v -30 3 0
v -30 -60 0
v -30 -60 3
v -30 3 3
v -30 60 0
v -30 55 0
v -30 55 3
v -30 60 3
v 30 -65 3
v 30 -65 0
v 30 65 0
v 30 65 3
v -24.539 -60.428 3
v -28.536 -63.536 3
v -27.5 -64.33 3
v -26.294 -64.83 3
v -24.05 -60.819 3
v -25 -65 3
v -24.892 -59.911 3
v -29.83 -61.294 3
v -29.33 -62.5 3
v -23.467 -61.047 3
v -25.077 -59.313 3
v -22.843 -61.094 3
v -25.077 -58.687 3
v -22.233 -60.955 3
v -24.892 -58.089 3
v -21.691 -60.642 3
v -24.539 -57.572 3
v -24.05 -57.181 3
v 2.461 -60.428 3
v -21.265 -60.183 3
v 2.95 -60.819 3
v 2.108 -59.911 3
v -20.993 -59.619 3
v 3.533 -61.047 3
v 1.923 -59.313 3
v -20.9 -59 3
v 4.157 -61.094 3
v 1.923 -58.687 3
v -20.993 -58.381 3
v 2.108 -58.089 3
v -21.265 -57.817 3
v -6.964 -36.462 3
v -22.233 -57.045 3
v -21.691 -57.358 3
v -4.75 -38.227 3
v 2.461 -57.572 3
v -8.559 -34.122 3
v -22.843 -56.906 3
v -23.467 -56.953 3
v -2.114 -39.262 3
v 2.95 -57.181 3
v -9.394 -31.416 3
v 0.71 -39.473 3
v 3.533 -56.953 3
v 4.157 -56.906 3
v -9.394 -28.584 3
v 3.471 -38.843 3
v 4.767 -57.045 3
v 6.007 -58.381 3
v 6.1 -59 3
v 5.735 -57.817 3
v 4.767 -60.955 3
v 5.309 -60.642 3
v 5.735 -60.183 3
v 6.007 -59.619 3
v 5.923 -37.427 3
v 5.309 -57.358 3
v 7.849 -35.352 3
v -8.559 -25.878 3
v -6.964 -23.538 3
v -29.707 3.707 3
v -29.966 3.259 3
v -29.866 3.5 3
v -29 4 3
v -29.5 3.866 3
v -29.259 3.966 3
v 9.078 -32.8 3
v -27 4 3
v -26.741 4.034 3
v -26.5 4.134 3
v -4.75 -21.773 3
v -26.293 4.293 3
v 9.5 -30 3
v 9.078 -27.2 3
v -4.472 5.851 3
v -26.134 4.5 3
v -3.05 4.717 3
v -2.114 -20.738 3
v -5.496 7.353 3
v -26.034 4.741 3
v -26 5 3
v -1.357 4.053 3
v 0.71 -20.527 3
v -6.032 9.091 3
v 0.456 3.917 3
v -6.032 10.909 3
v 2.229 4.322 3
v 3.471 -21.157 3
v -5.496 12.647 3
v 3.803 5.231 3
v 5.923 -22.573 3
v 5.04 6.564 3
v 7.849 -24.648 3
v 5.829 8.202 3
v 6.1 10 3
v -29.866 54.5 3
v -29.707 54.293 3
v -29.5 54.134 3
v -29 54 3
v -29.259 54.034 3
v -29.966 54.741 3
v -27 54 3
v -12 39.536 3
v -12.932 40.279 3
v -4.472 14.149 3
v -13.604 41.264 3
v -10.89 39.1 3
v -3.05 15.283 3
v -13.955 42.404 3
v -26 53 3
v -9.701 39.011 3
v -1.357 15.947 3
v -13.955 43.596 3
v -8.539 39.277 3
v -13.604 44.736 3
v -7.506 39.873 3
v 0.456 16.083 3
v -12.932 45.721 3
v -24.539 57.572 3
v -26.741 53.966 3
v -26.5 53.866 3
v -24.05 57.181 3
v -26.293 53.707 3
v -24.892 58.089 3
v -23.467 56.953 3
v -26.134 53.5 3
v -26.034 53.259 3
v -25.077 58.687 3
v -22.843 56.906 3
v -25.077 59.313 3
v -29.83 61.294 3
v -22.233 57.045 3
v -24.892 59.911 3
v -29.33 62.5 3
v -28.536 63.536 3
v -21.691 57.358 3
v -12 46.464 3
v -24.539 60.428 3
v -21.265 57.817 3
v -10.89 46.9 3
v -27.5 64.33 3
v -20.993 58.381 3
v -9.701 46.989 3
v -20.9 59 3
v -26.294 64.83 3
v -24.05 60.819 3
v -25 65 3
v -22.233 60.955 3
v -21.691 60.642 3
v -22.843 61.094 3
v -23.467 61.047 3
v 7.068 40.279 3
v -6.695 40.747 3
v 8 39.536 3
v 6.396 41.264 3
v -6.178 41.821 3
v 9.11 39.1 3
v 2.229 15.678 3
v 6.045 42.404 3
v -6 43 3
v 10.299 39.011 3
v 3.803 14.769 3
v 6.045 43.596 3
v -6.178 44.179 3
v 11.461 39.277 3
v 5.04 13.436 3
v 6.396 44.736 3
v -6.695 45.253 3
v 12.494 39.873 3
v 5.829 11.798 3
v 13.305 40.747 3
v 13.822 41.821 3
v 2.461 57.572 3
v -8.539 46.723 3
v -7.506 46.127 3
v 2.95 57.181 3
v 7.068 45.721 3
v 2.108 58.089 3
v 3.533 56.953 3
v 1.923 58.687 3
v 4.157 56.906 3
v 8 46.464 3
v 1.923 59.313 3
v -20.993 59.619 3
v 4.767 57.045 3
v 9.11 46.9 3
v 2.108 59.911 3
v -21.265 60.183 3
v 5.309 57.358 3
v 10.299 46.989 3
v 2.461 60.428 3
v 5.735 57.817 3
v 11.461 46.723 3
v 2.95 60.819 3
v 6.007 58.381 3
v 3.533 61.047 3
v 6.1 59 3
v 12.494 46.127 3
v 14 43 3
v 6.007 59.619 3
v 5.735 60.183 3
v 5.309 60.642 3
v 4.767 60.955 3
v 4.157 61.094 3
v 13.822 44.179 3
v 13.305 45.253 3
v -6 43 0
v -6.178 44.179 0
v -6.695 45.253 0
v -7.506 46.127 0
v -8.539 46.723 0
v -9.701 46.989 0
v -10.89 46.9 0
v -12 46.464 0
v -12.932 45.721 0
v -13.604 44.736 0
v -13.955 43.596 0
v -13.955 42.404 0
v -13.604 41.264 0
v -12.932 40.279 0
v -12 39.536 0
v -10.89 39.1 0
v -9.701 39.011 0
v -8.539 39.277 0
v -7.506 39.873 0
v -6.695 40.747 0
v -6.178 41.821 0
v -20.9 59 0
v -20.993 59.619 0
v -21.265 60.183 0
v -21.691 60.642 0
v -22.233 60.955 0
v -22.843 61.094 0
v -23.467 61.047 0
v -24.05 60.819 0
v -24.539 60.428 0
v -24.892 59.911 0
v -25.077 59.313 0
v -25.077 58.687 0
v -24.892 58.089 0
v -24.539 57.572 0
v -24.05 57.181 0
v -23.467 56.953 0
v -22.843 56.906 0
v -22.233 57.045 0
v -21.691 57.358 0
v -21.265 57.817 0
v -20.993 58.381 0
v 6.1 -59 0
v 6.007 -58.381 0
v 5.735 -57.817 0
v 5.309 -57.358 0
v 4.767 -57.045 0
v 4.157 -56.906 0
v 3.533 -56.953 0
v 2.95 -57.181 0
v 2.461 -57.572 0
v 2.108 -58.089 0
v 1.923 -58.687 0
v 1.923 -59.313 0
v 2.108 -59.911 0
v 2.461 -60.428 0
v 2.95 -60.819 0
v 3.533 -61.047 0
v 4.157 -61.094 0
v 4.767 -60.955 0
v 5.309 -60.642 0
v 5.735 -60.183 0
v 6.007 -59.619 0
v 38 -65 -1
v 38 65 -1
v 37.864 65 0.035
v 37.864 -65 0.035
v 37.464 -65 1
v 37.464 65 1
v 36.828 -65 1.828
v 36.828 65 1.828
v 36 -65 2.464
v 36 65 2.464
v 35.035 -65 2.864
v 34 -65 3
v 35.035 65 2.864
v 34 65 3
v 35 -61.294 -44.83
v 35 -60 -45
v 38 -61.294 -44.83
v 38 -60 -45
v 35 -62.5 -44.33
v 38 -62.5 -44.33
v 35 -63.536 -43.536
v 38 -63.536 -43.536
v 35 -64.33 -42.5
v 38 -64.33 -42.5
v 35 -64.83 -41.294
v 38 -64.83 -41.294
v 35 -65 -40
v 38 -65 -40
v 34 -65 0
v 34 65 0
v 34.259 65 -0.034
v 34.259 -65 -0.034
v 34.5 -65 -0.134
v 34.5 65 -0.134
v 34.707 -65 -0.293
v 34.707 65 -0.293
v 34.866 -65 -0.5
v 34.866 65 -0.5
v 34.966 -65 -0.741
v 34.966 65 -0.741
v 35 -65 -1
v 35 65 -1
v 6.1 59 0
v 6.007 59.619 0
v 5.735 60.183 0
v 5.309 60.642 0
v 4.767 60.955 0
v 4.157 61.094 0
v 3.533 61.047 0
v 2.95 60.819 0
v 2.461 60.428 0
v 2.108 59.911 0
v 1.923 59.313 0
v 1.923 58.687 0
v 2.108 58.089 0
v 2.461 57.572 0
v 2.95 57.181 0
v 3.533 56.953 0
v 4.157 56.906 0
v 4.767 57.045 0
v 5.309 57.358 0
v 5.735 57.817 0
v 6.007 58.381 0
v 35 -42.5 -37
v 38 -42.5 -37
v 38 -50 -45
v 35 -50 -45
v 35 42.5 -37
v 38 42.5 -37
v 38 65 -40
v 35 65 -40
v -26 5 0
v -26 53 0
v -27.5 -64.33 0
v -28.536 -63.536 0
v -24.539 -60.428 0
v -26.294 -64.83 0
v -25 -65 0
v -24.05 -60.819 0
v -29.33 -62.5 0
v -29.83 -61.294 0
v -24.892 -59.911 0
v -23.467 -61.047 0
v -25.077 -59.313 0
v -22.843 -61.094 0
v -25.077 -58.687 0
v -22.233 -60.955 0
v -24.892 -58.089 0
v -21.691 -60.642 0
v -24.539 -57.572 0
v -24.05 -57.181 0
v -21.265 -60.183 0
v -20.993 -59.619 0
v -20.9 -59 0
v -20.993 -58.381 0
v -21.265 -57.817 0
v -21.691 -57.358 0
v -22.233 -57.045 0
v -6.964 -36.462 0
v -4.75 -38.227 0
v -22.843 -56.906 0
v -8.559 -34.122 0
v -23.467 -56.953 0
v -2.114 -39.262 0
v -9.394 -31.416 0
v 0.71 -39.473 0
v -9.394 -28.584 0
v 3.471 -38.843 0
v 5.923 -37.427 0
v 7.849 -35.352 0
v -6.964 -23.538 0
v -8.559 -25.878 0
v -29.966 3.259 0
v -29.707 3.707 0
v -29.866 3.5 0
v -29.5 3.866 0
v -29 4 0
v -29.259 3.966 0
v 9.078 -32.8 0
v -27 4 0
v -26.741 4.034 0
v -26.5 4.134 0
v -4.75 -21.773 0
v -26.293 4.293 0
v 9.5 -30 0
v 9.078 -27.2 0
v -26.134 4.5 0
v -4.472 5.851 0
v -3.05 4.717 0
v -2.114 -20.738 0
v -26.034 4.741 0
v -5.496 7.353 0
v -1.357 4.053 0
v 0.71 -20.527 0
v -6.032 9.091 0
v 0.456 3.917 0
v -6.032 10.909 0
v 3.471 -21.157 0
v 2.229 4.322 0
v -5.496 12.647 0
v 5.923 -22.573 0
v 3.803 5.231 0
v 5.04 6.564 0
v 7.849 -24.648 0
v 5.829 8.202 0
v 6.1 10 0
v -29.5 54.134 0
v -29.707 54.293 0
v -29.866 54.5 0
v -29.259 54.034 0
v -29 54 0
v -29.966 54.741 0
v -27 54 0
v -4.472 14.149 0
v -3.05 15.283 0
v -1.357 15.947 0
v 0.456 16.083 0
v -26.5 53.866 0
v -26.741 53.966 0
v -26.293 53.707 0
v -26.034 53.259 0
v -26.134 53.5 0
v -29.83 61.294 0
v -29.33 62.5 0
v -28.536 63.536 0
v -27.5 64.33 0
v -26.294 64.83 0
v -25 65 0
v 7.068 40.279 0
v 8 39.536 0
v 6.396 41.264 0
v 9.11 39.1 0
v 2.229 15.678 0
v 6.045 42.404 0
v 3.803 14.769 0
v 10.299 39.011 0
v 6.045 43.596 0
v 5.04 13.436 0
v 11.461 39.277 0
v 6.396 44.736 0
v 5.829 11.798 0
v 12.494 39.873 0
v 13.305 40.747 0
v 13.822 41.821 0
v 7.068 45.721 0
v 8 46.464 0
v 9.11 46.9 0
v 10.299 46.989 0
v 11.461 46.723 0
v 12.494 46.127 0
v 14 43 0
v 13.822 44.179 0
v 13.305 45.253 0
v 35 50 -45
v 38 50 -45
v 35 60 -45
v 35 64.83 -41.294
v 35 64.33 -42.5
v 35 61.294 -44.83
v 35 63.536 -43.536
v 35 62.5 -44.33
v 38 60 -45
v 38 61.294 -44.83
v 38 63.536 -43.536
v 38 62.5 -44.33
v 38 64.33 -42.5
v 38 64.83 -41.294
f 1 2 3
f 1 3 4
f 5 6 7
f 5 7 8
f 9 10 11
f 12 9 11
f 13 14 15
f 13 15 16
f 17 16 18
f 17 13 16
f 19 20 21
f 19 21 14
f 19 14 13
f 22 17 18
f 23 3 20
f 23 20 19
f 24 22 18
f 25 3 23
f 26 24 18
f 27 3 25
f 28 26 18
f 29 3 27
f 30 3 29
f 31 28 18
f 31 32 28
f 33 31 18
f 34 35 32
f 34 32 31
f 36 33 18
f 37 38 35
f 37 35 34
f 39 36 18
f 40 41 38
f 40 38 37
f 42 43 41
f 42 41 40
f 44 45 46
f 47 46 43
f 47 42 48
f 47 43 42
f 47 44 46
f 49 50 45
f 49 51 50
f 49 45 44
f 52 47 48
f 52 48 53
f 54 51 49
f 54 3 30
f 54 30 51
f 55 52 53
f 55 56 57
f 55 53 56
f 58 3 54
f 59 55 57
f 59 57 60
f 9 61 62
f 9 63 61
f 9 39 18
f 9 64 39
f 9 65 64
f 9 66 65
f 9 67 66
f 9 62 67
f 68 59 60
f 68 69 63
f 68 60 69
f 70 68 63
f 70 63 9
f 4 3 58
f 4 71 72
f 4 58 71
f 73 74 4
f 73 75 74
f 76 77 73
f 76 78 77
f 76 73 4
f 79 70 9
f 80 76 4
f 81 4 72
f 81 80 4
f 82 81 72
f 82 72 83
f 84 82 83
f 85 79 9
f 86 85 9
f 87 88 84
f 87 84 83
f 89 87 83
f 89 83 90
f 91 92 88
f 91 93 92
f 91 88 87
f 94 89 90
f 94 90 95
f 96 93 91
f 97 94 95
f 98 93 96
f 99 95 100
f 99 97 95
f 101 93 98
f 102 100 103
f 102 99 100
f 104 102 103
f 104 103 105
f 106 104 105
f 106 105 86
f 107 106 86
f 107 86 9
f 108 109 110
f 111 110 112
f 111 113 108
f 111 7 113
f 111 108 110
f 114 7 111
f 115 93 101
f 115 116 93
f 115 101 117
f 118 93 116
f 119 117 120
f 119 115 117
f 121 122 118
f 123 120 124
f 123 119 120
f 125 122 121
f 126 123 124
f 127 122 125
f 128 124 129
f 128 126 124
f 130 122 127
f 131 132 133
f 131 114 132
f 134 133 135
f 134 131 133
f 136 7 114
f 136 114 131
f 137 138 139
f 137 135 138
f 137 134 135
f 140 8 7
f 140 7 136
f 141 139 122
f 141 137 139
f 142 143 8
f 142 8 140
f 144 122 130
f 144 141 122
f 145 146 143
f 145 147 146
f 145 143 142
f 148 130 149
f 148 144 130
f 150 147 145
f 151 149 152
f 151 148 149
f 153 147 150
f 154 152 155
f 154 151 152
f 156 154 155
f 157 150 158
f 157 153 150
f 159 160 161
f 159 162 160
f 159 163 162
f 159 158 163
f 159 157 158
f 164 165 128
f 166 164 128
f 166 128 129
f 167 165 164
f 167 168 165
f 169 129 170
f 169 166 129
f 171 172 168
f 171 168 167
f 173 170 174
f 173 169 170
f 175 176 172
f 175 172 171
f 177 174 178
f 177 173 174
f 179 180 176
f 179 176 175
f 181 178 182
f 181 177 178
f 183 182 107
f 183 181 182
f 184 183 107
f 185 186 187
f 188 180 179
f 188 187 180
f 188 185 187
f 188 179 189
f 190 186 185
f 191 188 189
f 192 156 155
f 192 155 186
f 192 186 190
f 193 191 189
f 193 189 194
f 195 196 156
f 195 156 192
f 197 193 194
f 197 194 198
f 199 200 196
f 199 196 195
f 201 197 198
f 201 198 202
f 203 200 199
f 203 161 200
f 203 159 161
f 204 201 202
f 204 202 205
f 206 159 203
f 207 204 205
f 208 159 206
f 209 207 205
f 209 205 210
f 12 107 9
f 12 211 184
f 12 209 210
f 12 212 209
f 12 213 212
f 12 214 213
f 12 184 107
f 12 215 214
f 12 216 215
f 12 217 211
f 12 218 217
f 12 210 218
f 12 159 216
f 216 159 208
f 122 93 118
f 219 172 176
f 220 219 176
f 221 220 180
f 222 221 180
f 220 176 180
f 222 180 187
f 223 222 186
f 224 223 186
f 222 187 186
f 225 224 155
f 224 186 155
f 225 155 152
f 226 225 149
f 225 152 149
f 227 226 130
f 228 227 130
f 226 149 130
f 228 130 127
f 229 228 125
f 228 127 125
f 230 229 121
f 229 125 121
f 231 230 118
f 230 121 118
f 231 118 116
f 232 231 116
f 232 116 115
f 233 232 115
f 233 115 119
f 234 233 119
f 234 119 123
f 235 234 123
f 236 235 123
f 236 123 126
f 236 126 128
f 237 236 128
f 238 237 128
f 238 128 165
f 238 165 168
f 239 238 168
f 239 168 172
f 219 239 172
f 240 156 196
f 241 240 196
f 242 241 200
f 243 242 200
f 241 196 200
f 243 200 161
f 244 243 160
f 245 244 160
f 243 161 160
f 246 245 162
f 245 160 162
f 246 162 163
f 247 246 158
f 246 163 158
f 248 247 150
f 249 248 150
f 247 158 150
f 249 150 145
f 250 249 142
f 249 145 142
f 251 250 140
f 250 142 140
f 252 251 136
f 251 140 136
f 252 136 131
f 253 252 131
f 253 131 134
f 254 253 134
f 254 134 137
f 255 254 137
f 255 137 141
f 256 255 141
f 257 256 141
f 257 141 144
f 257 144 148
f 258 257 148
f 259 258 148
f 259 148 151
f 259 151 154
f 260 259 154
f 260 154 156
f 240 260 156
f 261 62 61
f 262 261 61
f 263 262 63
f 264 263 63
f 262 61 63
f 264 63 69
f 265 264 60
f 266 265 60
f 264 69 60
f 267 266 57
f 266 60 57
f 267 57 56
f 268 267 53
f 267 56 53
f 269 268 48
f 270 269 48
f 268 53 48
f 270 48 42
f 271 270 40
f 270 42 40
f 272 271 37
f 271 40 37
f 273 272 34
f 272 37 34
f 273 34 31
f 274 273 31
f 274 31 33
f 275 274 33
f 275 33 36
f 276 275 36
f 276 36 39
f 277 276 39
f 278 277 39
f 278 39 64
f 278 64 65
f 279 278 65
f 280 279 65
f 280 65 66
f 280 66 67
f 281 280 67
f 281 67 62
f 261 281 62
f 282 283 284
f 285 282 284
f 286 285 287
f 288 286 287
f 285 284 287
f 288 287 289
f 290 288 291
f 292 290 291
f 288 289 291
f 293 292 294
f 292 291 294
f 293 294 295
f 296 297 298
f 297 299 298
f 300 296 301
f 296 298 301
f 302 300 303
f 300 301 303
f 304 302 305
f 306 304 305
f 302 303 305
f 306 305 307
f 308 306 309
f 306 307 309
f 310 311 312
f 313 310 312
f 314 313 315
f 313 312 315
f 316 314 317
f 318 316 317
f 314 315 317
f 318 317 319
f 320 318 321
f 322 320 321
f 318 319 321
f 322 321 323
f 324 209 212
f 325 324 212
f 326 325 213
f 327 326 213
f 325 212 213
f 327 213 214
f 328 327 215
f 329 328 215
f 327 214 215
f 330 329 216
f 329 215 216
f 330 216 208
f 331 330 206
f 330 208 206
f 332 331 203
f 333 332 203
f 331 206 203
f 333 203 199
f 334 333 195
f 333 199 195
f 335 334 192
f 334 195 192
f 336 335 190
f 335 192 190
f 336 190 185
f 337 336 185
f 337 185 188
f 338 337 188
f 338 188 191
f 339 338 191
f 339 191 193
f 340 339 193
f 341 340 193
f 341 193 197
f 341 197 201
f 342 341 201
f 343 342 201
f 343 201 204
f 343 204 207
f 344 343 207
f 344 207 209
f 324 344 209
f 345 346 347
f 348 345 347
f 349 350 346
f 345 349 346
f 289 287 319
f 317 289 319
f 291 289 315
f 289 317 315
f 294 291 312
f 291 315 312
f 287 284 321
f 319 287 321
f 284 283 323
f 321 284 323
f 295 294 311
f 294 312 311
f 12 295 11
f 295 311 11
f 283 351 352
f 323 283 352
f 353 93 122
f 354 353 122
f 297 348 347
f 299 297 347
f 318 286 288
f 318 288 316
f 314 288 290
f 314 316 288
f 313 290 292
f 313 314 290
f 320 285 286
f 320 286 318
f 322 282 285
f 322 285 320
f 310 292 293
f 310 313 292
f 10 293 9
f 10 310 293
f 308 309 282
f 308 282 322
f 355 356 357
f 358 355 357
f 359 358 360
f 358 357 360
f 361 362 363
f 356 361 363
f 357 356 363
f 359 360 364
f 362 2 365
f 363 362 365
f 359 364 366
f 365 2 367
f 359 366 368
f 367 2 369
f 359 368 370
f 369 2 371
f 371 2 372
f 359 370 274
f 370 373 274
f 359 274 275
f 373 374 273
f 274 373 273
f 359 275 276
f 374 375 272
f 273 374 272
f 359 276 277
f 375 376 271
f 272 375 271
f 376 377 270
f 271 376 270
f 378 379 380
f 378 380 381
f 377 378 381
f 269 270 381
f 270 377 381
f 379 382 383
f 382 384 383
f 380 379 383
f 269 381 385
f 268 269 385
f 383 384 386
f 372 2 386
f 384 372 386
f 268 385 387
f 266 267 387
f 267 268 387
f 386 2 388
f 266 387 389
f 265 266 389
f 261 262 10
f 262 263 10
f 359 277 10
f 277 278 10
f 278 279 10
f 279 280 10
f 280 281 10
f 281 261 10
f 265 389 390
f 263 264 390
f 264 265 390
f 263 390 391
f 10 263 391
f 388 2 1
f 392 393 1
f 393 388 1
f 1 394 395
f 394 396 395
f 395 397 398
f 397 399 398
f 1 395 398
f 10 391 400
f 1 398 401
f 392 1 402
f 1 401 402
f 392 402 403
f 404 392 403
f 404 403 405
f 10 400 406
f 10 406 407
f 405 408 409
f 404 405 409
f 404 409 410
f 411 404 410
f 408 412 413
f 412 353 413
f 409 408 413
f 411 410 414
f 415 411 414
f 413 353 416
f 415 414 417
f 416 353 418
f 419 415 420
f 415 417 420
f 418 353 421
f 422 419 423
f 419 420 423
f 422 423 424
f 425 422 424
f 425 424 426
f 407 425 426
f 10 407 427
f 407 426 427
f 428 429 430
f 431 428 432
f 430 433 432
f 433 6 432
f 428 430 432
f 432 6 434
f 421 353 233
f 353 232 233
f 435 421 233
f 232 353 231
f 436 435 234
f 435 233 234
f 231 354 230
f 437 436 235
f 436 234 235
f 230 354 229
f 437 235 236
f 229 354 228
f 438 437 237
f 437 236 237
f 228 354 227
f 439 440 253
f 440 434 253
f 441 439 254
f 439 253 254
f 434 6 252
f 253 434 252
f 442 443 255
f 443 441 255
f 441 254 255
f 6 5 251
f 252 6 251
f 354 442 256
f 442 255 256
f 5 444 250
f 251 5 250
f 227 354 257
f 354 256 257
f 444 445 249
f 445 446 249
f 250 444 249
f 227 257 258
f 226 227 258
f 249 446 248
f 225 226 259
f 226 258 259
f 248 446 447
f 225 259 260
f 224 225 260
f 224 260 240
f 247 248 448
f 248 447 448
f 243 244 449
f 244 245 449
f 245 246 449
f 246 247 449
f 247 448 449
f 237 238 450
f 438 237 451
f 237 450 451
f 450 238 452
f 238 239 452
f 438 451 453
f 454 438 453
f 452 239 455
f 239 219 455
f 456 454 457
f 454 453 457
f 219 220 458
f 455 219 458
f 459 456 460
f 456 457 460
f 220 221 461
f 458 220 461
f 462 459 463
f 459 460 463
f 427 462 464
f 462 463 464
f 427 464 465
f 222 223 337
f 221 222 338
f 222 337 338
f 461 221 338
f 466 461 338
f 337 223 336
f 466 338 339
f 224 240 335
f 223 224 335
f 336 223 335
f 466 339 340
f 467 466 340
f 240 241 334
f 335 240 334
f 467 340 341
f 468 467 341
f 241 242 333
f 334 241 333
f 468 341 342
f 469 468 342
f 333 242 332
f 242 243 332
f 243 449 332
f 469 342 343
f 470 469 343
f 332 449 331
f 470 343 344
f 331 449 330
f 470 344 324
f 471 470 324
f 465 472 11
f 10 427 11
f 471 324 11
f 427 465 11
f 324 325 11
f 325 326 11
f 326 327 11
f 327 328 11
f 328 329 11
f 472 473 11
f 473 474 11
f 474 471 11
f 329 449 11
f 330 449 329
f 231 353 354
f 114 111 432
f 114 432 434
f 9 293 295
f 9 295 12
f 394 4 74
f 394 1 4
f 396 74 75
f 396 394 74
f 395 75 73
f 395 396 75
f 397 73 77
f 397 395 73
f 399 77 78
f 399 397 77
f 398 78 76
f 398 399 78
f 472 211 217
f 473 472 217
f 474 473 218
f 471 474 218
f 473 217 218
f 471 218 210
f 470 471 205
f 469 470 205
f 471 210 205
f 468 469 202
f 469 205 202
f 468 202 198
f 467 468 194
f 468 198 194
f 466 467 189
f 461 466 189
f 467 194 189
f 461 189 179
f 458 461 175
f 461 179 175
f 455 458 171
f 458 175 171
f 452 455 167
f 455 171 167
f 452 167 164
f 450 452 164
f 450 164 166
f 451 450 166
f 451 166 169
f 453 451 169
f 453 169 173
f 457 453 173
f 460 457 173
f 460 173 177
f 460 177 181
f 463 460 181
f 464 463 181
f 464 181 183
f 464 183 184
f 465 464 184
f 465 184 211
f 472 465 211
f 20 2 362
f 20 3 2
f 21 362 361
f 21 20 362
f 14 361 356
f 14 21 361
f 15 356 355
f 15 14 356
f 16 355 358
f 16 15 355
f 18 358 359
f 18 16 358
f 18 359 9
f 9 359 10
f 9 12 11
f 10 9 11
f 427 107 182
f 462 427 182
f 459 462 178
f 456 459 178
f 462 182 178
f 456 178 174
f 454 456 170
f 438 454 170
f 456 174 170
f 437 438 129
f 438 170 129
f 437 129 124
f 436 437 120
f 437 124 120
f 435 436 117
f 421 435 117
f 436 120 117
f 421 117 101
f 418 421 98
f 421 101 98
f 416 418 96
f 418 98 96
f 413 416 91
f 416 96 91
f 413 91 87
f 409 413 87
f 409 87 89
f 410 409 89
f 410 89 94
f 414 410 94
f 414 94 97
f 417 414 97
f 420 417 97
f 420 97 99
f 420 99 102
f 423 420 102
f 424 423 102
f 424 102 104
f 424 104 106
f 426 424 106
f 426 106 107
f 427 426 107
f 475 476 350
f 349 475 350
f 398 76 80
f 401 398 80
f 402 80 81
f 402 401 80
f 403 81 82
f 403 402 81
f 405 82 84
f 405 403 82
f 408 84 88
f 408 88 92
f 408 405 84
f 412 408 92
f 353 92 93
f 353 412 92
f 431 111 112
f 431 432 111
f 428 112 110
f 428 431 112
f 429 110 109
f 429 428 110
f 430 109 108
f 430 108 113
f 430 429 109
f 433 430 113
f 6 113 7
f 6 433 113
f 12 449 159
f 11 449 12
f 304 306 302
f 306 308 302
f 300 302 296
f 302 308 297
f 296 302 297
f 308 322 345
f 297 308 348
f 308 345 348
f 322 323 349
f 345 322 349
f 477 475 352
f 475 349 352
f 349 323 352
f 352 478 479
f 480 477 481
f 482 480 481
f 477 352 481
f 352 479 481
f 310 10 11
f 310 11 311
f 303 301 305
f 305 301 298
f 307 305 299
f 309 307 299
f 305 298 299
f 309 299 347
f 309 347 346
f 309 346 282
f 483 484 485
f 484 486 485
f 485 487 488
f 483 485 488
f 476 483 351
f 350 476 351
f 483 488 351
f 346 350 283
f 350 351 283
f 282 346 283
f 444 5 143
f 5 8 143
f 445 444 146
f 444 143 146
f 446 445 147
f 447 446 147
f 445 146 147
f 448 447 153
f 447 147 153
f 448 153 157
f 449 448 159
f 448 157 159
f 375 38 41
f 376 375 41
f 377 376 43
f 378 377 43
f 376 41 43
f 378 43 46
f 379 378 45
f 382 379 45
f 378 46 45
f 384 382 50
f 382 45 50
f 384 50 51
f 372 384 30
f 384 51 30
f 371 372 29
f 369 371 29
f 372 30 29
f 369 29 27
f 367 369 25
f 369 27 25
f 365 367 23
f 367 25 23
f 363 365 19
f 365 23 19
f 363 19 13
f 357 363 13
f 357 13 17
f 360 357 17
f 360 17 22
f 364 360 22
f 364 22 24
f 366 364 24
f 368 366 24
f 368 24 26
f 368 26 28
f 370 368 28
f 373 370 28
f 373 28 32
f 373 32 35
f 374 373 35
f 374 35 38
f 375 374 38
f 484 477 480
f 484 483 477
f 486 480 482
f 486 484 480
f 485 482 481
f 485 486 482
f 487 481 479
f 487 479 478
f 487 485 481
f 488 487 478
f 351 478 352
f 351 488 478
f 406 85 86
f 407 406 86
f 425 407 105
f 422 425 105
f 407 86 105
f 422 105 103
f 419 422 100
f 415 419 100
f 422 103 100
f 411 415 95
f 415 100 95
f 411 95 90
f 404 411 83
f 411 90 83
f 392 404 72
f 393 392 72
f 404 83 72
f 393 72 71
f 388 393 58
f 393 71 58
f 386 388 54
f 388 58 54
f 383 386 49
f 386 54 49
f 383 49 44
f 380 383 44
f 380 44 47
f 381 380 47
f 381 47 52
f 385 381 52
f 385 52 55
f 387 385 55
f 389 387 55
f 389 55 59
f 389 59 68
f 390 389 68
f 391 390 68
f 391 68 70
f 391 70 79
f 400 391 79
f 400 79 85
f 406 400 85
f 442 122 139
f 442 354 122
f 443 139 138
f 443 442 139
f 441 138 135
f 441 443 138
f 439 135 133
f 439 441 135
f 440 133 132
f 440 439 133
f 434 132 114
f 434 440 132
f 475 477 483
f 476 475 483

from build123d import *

# Parameters (mm, degrees)
SKETCH1_W              = 60
SKETCH1_H              = 130
BOSS_EXTRUDE1_DEPTH    = 3
SKETCH2_R              = 2.1
CUT_EXTRUDE1_DEPTH     = 72.651936471
LPATTERN1_COUNT        = 2
LPATTERN1_PITCH        = 27
LPATTERN1_COUNT_DIR2   = 2
LPATTERN1_PITCH_DIR2   = 118
SKETCH3_R              = 9.5
CUT_EXTRUDE2_DEPTH     = 72.651936471
SKETCH_1_R             = 6.1
CUT_EXTRUDE_1_DEPTH    = 72.651936471
SKETCH_2_R             = 4
CUT_EXTRUDE_2_DEPTH    = 72.651936471
FILLET_1_R             = 5
SM_BASE_FLANGE_1_DEPTH = 130
FILLET_2_R             = 5
CUT_EXTRUDE_3_DEPTH    = 105.27847333
SKETCH_9_W             = 4
SKETCH_9_H             = 50
CUT_EXTRUDE_4_DEPTH    = 90.291656945
FILLET_3_R             = 1


# Sheet-metal steps are written as plain solids
with BuildPart() as part:
    # Sketch1 → Boss-Extrude1 (new body)
    with BuildSketch(Plane.XY):
        Rectangle(SKETCH1_W, SKETCH1_H)
    extrude(amount=BOSS_EXTRUDE1_DEPTH)

    # Sketch2 → Cut-Extrude1 (cut, through all)
    with BuildSketch(Plane.XY.offset(3)):
        with Locations((-23, 59)):
            Circle(SKETCH2_R)
    cut_extrude1 = extrude(amount=-CUT_EXTRUDE1_DEPTH, mode=Mode.SUBTRACT)

    # LPattern1: Cut-Extrude1 2 × 2
    with Locations(*[(i * LPATTERN1_PITCH, -j * LPATTERN1_PITCH_DIR2, 0) for i in range(LPATTERN1_COUNT) for j in range(LPATTERN1_COUNT_DIR2) if (i, j) != (0, 0)]):
        add(cut_extrude1, mode=Mode.SUBTRACT)

    # Sketch3 → Cut-Extrude2 (cut, through all)
    with BuildSketch(Plane.XY.offset(3)):
        with Locations((0, -30)):
            Circle(SKETCH3_R)
    extrude(amount=-CUT_EXTRUDE2_DEPTH, mode=Mode.SUBTRACT)

    # 草圖1 → 除料-伸長1 (cut, through all)
    with BuildSketch(Plane.XY.offset(3)):
        with Locations((0, 10)):
            Circle(SKETCH_1_R)
    extrude(amount=-CUT_EXTRUDE_1_DEPTH, mode=Mode.SUBTRACT)

    # 草圖2 → 除料-伸長2 (cut, through all)
    with BuildSketch(Plane.XY.offset(3)):
        with Locations((-10, 43)):
            Circle(SKETCH_2_R)
        with Locations((10, 43)):
            Circle(SKETCH_2_R)
    extrude(amount=-CUT_EXTRUDE_2_DEPTH, mode=Mode.SUBTRACT)

    # 圓角1
    fillet_1_edges = [part.edges().sort_by_distance(p)[0] for p in [
        (-30, -65, 1.5),
        (-30, 65, 1.5),
    ]]
    fillet(fillet_1_edges, radius=FILLET_1_R)

    # 草圖9 → 除料-伸長4 (cut, through all)
    with BuildSketch(Plane.XY.offset(3)):
        with Locations((-28, 29)):
            Rectangle(SKETCH_9_W, SKETCH_9_H)
    extrude(amount=-CUT_EXTRUDE_4_DEPTH, mode=Mode.SUBTRACT)

    # 圓角3
    fillet_3_edges = [part.edges().sort_by_distance(p)[0] for p in [
        (-30, 4, 1.5),
        (-30, 54, 1.5),
        (-26, 54, 1.5),
        (-26, 4, 1.5),
    ]]
    fillet(fillet_3_edges, radius=FILLET_3_R)


with BuildPart() as body_2:
    # 草圖3 → 基材-凸緣1 (new body)
    with BuildSketch(Plane(origin=(30, 65, 0), x_dir=(1, 0, 0), z_dir=(0, 1, 0))):
        with BuildLine():
            Line((0, 0), (4, 0))
            ThreePointArc((4, 0), (4.707106781, 0.292893219), (5, 1))
            Line((5, 1), (5, 45))
            Line((5, 45), (8, 45))
            Line((8, 45), (8, 1))
            ThreePointArc((8, 1), (6.828427125, -1.828427125), (4, -3))
            Line((4, -3), (0, -3))
            Line((0, -3), (0, 0))
        make_face()
    extrude(amount=-SM_BASE_FLANGE_1_DEPTH)

    # 圓角2
    fillet_2_edges = [body_2.edges().sort_by_distance(p)[0] for p in [
        (36.5, -65, -45),
        (36.5, 65, -45),
    ]]
    fillet(fillet_2_edges, radius=FILLET_2_R)

    # 草圖8 → 除料-伸長3 (cut, through all)
    with BuildSketch(Plane(origin=(38, 0, 0), x_dir=(0, 0, -1), z_dir=(1, 0, 0))):
        Polygon((45, 50), (37, 42.5), (37, -42.5), (45, -50), align=None)
    extrude(amount=-CUT_EXTRUDE_3_DEPTH, mode=Mode.SUBTRACT)


solid = Compound([part.part, body_2.part])
